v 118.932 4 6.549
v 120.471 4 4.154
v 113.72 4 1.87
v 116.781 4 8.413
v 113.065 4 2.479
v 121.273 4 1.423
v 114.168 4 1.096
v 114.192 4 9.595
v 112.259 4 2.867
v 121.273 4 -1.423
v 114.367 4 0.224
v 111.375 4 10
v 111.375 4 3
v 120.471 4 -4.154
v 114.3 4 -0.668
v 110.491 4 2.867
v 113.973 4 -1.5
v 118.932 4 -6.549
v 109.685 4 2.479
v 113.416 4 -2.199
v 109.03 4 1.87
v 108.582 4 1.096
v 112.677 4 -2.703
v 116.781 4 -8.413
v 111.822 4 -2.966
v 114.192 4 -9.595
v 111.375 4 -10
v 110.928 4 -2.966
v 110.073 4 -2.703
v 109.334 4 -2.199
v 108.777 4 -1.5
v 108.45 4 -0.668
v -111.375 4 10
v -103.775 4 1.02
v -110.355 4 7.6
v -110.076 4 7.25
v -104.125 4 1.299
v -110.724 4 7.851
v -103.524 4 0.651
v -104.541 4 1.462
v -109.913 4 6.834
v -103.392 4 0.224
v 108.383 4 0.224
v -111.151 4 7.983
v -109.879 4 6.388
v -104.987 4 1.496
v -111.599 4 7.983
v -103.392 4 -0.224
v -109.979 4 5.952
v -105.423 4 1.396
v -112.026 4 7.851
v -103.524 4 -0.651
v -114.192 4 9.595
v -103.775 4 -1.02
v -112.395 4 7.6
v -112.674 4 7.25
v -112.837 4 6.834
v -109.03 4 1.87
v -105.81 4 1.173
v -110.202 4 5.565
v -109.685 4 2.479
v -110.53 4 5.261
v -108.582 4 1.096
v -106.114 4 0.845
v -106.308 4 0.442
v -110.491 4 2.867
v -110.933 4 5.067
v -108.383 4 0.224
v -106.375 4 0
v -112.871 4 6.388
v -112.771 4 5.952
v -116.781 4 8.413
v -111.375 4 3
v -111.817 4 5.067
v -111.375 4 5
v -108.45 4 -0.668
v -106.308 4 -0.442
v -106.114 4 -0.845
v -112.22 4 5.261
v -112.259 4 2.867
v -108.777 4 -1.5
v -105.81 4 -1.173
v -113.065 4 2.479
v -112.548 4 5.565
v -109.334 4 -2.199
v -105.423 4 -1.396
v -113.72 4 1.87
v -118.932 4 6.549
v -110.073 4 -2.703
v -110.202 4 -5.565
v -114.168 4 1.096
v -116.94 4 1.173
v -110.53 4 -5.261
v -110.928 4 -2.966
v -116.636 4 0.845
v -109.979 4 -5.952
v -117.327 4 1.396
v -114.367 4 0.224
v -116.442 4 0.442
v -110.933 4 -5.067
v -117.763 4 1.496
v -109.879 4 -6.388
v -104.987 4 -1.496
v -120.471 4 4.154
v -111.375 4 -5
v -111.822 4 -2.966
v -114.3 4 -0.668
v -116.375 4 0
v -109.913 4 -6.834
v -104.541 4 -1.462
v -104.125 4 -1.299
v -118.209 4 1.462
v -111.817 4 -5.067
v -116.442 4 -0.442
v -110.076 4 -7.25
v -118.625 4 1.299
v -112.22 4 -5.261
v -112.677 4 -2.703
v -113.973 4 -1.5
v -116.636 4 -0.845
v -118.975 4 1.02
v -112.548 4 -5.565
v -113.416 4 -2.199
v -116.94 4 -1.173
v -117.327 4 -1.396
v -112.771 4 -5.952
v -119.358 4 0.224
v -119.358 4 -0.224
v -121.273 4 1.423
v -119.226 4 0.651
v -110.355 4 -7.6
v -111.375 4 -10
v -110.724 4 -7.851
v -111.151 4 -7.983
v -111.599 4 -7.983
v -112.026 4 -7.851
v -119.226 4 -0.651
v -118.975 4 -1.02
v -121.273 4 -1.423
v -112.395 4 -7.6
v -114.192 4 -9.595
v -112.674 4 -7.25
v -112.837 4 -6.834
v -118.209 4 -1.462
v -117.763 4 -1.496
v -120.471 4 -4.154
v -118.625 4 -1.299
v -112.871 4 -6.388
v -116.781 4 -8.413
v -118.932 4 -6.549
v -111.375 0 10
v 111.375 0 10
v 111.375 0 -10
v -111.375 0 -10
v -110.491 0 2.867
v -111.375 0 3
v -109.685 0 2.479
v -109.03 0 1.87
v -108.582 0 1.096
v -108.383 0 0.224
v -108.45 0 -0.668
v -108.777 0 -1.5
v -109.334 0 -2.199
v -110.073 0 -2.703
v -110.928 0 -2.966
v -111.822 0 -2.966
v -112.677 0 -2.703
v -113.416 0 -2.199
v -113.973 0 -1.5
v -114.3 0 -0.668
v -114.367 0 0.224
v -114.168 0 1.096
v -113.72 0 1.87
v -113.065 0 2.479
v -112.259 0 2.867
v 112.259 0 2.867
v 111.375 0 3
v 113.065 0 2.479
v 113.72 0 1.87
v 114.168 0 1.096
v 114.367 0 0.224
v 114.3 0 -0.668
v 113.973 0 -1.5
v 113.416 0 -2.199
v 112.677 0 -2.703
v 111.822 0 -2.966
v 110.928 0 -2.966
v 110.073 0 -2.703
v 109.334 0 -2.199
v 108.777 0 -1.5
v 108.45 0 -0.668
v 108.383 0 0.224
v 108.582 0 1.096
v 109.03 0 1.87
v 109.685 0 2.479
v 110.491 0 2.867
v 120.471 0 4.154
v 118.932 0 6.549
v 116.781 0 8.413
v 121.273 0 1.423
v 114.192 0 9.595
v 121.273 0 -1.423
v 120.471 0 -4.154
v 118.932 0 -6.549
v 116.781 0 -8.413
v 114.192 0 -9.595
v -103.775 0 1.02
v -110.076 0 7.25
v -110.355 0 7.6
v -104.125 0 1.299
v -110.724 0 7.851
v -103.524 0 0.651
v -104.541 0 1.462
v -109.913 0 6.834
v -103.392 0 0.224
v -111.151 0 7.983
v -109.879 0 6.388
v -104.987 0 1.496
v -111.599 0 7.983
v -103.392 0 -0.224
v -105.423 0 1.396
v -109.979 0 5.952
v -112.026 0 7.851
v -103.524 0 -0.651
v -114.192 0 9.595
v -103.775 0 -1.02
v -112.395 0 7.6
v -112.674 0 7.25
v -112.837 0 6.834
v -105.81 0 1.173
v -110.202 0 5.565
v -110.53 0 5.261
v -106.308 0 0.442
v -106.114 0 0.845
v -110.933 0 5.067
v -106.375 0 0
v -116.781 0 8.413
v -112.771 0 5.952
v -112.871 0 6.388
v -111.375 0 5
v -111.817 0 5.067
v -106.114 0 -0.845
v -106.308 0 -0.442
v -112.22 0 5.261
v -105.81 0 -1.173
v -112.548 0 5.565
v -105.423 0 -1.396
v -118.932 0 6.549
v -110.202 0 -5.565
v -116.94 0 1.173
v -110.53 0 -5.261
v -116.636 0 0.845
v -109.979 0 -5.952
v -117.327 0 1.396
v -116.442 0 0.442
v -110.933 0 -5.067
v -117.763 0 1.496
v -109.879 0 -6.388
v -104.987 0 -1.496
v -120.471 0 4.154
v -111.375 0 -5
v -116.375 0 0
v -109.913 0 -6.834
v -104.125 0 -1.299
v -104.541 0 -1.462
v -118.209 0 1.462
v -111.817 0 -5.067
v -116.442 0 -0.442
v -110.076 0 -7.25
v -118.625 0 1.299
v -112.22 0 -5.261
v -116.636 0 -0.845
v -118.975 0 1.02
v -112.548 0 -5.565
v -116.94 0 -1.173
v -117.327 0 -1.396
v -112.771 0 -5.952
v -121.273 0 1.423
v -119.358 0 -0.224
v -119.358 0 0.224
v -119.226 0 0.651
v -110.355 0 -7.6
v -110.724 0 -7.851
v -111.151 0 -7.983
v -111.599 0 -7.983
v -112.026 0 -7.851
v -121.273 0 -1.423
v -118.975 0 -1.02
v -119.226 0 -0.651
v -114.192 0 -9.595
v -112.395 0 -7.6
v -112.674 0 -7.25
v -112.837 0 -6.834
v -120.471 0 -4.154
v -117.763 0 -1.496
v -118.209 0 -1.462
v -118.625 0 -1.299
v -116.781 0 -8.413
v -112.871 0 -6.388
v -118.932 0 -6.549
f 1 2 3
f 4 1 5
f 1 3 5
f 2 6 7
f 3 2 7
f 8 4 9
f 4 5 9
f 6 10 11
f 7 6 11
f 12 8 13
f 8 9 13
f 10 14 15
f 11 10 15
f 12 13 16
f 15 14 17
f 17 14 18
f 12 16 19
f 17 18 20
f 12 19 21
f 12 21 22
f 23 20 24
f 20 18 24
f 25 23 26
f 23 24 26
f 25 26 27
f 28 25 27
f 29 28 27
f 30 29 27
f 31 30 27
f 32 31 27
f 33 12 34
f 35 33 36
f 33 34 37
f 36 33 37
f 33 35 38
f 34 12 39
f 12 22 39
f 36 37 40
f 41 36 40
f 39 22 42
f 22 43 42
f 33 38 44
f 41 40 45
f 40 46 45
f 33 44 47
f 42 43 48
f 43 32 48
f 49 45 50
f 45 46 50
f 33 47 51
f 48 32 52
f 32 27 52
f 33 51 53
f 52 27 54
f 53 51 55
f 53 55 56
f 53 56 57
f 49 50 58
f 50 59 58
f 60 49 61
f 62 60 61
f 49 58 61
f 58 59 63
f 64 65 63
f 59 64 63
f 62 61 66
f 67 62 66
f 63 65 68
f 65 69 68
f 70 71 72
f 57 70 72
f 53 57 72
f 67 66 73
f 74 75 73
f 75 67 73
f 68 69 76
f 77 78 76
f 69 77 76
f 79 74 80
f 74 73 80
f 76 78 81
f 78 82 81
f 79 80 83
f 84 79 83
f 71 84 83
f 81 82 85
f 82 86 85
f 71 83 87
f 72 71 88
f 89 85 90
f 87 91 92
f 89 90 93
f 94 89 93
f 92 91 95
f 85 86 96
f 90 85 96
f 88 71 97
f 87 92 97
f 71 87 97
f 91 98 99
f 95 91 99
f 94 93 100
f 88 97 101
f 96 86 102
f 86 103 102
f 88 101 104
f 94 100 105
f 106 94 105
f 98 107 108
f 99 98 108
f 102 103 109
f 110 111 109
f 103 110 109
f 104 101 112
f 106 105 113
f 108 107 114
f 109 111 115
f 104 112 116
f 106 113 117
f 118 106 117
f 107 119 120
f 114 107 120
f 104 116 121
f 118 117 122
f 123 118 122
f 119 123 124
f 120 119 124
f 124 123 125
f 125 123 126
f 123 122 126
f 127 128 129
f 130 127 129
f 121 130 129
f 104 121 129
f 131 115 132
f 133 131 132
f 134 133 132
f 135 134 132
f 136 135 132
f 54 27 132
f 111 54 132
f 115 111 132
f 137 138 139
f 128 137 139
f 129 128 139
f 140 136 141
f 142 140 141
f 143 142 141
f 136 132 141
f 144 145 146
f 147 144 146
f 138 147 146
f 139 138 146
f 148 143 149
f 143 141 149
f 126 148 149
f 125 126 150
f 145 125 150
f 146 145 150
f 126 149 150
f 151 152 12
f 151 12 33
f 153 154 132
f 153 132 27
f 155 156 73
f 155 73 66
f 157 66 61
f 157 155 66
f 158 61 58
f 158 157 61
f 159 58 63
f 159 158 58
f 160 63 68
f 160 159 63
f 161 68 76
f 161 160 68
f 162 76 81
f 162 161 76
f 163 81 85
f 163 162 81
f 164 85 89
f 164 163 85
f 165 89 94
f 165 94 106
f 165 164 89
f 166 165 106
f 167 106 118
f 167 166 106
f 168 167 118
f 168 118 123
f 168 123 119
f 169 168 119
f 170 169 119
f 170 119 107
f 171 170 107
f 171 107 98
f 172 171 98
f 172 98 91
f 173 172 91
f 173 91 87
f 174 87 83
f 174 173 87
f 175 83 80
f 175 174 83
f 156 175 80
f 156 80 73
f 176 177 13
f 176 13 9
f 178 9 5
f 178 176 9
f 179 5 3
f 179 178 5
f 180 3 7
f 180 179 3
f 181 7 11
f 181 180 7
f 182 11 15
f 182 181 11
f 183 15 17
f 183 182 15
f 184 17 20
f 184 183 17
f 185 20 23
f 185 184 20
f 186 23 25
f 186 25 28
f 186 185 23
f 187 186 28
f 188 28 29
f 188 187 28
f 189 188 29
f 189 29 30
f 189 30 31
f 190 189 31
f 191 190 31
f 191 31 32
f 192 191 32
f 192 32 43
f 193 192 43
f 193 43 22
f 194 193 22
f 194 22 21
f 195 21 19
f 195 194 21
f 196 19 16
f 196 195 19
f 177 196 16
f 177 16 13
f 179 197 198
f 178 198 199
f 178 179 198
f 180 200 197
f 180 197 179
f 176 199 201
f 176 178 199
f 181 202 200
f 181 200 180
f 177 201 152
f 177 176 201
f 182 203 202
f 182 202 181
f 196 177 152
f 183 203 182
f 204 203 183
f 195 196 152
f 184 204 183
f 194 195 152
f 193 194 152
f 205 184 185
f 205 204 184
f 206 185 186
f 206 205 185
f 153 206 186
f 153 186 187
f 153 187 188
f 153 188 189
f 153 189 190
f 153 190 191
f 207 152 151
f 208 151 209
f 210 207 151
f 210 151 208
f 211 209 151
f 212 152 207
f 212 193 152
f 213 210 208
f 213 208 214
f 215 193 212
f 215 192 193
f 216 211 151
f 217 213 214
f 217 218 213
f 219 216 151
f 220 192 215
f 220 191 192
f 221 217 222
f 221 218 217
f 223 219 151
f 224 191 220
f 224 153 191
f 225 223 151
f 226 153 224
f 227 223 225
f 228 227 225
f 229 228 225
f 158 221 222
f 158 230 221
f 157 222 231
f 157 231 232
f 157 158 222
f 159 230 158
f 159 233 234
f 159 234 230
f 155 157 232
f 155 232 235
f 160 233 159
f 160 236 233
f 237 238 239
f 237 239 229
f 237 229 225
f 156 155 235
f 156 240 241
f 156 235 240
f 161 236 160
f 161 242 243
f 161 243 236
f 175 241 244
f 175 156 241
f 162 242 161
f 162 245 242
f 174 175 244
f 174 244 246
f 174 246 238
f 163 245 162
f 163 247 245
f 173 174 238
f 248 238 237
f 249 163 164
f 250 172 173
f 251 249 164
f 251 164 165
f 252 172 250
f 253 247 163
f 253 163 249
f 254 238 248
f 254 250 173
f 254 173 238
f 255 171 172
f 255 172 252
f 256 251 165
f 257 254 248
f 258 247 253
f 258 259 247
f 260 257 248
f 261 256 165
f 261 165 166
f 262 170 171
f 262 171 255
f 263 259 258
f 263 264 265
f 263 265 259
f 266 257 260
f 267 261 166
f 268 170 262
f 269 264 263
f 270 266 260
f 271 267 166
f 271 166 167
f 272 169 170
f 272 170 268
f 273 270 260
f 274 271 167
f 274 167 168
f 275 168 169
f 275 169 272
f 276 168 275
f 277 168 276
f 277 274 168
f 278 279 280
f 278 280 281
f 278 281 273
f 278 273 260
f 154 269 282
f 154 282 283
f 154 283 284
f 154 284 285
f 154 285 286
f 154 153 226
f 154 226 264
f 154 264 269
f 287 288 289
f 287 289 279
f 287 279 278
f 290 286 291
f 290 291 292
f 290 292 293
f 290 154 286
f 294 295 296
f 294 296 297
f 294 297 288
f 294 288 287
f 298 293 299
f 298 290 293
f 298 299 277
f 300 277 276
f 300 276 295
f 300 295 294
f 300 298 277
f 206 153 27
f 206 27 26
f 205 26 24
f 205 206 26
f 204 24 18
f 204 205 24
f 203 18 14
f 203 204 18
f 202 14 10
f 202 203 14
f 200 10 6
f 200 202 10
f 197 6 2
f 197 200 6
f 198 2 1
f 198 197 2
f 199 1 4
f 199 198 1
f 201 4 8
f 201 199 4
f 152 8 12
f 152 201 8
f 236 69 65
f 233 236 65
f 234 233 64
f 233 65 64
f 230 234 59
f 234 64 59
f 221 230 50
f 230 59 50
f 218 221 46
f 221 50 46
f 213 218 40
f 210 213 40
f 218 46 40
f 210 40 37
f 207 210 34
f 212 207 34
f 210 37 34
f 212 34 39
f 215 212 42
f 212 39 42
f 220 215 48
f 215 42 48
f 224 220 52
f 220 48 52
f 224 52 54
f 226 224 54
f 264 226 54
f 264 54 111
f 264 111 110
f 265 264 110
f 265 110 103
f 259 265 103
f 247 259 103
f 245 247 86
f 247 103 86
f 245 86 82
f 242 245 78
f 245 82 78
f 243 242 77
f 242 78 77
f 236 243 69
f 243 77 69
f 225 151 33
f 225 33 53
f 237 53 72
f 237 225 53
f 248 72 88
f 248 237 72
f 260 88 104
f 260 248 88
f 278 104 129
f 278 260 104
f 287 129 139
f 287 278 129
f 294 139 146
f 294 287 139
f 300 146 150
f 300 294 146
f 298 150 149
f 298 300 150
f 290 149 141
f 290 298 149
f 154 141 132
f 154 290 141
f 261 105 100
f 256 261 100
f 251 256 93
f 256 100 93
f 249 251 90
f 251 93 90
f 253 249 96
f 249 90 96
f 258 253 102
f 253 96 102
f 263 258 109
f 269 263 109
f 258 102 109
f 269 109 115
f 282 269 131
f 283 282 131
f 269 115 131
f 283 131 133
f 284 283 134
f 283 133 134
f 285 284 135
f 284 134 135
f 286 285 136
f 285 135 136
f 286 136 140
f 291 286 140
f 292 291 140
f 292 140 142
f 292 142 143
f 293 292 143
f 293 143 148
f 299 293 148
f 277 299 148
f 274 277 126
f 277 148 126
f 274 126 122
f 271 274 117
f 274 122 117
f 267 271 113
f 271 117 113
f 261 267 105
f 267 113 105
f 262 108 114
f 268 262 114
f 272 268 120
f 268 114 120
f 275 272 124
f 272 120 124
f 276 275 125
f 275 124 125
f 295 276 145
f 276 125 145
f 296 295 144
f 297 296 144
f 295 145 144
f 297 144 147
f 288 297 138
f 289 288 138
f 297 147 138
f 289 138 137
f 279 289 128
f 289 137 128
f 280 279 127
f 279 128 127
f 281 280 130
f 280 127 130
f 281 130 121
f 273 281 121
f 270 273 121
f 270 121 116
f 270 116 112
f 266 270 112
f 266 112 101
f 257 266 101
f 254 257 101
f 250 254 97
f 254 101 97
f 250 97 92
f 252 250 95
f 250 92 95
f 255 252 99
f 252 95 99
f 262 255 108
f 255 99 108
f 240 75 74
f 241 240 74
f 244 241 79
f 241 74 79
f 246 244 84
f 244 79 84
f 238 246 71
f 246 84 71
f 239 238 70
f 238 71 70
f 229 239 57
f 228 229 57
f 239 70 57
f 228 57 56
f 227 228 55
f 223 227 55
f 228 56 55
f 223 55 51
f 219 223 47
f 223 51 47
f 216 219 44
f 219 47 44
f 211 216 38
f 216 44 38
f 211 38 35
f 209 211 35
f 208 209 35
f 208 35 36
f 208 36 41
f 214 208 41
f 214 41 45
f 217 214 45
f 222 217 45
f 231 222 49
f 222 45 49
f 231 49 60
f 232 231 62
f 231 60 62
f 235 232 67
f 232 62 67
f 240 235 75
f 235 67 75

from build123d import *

# Parameters (mm, degrees)
SKETCH_1_R               = 3
EXTRUDE_1_DEPTH          = 4
SKETCH_2_R               = 1.5
CUT_EXTRUDE_1_DEPTH      = 4
PATTERN_CIRCULAR_1_COUNT = 4


with BuildPart() as part:
    # 草图1 → 凸台-拉伸1 (new body)
    with BuildSketch(Plane(origin=(0, 0, 0), x_dir=(1, 0, 0), z_dir=(0, 1, 0))):
        with BuildLine():
            Line((-111.375, 10), (111.375, 10))
            ThreePointArc((111.375, 10), (121.375, 0), (111.375, -10))
            Line((111.375, -10), (-111.375, -10))
            ThreePointArc((-111.375, -10), (-121.375, 0), (-111.375, 10))
        make_face()
        with Locations(Location((-111.375, 0, 0), (0, 0, 270))):
            Circle(SKETCH_1_R, mode=Mode.SUBTRACT)
        with Locations(Location((111.375, 0, 0), (0, 0, 270))):
            Circle(SKETCH_1_R, mode=Mode.SUBTRACT)
    extrude(amount=EXTRUDE_1_DEPTH)

    # 草图2 → 切除-拉伸1 (cut)
    with BuildSketch(Plane(origin=(0, 4, 0), x_dir=(1, 0, 0), z_dir=(0, 1, 0))):
        with Locations(Location((-111.375, 6.5, 0), (0, 0, 270))):
            Circle(SKETCH_2_R)
    cut_extrude_1 = extrude(amount=-CUT_EXTRUDE_1_DEPTH, mode=Mode.SUBTRACT)

    # 阵列(圆周)1: 切除-拉伸1 ×4 about axis
    pattern_circular_1_axis = Axis((-111.375, 0, 0), (0, 1, 0))
    for i in range(1, PATTERN_CIRCULAR_1_COUNT):
        add(cut_extrude_1.rotate(pattern_circular_1_axis, i * 360 / PATTERN_CIRCULAR_1_COUNT), mode=Mode.SUBTRACT)


solid = part.part
